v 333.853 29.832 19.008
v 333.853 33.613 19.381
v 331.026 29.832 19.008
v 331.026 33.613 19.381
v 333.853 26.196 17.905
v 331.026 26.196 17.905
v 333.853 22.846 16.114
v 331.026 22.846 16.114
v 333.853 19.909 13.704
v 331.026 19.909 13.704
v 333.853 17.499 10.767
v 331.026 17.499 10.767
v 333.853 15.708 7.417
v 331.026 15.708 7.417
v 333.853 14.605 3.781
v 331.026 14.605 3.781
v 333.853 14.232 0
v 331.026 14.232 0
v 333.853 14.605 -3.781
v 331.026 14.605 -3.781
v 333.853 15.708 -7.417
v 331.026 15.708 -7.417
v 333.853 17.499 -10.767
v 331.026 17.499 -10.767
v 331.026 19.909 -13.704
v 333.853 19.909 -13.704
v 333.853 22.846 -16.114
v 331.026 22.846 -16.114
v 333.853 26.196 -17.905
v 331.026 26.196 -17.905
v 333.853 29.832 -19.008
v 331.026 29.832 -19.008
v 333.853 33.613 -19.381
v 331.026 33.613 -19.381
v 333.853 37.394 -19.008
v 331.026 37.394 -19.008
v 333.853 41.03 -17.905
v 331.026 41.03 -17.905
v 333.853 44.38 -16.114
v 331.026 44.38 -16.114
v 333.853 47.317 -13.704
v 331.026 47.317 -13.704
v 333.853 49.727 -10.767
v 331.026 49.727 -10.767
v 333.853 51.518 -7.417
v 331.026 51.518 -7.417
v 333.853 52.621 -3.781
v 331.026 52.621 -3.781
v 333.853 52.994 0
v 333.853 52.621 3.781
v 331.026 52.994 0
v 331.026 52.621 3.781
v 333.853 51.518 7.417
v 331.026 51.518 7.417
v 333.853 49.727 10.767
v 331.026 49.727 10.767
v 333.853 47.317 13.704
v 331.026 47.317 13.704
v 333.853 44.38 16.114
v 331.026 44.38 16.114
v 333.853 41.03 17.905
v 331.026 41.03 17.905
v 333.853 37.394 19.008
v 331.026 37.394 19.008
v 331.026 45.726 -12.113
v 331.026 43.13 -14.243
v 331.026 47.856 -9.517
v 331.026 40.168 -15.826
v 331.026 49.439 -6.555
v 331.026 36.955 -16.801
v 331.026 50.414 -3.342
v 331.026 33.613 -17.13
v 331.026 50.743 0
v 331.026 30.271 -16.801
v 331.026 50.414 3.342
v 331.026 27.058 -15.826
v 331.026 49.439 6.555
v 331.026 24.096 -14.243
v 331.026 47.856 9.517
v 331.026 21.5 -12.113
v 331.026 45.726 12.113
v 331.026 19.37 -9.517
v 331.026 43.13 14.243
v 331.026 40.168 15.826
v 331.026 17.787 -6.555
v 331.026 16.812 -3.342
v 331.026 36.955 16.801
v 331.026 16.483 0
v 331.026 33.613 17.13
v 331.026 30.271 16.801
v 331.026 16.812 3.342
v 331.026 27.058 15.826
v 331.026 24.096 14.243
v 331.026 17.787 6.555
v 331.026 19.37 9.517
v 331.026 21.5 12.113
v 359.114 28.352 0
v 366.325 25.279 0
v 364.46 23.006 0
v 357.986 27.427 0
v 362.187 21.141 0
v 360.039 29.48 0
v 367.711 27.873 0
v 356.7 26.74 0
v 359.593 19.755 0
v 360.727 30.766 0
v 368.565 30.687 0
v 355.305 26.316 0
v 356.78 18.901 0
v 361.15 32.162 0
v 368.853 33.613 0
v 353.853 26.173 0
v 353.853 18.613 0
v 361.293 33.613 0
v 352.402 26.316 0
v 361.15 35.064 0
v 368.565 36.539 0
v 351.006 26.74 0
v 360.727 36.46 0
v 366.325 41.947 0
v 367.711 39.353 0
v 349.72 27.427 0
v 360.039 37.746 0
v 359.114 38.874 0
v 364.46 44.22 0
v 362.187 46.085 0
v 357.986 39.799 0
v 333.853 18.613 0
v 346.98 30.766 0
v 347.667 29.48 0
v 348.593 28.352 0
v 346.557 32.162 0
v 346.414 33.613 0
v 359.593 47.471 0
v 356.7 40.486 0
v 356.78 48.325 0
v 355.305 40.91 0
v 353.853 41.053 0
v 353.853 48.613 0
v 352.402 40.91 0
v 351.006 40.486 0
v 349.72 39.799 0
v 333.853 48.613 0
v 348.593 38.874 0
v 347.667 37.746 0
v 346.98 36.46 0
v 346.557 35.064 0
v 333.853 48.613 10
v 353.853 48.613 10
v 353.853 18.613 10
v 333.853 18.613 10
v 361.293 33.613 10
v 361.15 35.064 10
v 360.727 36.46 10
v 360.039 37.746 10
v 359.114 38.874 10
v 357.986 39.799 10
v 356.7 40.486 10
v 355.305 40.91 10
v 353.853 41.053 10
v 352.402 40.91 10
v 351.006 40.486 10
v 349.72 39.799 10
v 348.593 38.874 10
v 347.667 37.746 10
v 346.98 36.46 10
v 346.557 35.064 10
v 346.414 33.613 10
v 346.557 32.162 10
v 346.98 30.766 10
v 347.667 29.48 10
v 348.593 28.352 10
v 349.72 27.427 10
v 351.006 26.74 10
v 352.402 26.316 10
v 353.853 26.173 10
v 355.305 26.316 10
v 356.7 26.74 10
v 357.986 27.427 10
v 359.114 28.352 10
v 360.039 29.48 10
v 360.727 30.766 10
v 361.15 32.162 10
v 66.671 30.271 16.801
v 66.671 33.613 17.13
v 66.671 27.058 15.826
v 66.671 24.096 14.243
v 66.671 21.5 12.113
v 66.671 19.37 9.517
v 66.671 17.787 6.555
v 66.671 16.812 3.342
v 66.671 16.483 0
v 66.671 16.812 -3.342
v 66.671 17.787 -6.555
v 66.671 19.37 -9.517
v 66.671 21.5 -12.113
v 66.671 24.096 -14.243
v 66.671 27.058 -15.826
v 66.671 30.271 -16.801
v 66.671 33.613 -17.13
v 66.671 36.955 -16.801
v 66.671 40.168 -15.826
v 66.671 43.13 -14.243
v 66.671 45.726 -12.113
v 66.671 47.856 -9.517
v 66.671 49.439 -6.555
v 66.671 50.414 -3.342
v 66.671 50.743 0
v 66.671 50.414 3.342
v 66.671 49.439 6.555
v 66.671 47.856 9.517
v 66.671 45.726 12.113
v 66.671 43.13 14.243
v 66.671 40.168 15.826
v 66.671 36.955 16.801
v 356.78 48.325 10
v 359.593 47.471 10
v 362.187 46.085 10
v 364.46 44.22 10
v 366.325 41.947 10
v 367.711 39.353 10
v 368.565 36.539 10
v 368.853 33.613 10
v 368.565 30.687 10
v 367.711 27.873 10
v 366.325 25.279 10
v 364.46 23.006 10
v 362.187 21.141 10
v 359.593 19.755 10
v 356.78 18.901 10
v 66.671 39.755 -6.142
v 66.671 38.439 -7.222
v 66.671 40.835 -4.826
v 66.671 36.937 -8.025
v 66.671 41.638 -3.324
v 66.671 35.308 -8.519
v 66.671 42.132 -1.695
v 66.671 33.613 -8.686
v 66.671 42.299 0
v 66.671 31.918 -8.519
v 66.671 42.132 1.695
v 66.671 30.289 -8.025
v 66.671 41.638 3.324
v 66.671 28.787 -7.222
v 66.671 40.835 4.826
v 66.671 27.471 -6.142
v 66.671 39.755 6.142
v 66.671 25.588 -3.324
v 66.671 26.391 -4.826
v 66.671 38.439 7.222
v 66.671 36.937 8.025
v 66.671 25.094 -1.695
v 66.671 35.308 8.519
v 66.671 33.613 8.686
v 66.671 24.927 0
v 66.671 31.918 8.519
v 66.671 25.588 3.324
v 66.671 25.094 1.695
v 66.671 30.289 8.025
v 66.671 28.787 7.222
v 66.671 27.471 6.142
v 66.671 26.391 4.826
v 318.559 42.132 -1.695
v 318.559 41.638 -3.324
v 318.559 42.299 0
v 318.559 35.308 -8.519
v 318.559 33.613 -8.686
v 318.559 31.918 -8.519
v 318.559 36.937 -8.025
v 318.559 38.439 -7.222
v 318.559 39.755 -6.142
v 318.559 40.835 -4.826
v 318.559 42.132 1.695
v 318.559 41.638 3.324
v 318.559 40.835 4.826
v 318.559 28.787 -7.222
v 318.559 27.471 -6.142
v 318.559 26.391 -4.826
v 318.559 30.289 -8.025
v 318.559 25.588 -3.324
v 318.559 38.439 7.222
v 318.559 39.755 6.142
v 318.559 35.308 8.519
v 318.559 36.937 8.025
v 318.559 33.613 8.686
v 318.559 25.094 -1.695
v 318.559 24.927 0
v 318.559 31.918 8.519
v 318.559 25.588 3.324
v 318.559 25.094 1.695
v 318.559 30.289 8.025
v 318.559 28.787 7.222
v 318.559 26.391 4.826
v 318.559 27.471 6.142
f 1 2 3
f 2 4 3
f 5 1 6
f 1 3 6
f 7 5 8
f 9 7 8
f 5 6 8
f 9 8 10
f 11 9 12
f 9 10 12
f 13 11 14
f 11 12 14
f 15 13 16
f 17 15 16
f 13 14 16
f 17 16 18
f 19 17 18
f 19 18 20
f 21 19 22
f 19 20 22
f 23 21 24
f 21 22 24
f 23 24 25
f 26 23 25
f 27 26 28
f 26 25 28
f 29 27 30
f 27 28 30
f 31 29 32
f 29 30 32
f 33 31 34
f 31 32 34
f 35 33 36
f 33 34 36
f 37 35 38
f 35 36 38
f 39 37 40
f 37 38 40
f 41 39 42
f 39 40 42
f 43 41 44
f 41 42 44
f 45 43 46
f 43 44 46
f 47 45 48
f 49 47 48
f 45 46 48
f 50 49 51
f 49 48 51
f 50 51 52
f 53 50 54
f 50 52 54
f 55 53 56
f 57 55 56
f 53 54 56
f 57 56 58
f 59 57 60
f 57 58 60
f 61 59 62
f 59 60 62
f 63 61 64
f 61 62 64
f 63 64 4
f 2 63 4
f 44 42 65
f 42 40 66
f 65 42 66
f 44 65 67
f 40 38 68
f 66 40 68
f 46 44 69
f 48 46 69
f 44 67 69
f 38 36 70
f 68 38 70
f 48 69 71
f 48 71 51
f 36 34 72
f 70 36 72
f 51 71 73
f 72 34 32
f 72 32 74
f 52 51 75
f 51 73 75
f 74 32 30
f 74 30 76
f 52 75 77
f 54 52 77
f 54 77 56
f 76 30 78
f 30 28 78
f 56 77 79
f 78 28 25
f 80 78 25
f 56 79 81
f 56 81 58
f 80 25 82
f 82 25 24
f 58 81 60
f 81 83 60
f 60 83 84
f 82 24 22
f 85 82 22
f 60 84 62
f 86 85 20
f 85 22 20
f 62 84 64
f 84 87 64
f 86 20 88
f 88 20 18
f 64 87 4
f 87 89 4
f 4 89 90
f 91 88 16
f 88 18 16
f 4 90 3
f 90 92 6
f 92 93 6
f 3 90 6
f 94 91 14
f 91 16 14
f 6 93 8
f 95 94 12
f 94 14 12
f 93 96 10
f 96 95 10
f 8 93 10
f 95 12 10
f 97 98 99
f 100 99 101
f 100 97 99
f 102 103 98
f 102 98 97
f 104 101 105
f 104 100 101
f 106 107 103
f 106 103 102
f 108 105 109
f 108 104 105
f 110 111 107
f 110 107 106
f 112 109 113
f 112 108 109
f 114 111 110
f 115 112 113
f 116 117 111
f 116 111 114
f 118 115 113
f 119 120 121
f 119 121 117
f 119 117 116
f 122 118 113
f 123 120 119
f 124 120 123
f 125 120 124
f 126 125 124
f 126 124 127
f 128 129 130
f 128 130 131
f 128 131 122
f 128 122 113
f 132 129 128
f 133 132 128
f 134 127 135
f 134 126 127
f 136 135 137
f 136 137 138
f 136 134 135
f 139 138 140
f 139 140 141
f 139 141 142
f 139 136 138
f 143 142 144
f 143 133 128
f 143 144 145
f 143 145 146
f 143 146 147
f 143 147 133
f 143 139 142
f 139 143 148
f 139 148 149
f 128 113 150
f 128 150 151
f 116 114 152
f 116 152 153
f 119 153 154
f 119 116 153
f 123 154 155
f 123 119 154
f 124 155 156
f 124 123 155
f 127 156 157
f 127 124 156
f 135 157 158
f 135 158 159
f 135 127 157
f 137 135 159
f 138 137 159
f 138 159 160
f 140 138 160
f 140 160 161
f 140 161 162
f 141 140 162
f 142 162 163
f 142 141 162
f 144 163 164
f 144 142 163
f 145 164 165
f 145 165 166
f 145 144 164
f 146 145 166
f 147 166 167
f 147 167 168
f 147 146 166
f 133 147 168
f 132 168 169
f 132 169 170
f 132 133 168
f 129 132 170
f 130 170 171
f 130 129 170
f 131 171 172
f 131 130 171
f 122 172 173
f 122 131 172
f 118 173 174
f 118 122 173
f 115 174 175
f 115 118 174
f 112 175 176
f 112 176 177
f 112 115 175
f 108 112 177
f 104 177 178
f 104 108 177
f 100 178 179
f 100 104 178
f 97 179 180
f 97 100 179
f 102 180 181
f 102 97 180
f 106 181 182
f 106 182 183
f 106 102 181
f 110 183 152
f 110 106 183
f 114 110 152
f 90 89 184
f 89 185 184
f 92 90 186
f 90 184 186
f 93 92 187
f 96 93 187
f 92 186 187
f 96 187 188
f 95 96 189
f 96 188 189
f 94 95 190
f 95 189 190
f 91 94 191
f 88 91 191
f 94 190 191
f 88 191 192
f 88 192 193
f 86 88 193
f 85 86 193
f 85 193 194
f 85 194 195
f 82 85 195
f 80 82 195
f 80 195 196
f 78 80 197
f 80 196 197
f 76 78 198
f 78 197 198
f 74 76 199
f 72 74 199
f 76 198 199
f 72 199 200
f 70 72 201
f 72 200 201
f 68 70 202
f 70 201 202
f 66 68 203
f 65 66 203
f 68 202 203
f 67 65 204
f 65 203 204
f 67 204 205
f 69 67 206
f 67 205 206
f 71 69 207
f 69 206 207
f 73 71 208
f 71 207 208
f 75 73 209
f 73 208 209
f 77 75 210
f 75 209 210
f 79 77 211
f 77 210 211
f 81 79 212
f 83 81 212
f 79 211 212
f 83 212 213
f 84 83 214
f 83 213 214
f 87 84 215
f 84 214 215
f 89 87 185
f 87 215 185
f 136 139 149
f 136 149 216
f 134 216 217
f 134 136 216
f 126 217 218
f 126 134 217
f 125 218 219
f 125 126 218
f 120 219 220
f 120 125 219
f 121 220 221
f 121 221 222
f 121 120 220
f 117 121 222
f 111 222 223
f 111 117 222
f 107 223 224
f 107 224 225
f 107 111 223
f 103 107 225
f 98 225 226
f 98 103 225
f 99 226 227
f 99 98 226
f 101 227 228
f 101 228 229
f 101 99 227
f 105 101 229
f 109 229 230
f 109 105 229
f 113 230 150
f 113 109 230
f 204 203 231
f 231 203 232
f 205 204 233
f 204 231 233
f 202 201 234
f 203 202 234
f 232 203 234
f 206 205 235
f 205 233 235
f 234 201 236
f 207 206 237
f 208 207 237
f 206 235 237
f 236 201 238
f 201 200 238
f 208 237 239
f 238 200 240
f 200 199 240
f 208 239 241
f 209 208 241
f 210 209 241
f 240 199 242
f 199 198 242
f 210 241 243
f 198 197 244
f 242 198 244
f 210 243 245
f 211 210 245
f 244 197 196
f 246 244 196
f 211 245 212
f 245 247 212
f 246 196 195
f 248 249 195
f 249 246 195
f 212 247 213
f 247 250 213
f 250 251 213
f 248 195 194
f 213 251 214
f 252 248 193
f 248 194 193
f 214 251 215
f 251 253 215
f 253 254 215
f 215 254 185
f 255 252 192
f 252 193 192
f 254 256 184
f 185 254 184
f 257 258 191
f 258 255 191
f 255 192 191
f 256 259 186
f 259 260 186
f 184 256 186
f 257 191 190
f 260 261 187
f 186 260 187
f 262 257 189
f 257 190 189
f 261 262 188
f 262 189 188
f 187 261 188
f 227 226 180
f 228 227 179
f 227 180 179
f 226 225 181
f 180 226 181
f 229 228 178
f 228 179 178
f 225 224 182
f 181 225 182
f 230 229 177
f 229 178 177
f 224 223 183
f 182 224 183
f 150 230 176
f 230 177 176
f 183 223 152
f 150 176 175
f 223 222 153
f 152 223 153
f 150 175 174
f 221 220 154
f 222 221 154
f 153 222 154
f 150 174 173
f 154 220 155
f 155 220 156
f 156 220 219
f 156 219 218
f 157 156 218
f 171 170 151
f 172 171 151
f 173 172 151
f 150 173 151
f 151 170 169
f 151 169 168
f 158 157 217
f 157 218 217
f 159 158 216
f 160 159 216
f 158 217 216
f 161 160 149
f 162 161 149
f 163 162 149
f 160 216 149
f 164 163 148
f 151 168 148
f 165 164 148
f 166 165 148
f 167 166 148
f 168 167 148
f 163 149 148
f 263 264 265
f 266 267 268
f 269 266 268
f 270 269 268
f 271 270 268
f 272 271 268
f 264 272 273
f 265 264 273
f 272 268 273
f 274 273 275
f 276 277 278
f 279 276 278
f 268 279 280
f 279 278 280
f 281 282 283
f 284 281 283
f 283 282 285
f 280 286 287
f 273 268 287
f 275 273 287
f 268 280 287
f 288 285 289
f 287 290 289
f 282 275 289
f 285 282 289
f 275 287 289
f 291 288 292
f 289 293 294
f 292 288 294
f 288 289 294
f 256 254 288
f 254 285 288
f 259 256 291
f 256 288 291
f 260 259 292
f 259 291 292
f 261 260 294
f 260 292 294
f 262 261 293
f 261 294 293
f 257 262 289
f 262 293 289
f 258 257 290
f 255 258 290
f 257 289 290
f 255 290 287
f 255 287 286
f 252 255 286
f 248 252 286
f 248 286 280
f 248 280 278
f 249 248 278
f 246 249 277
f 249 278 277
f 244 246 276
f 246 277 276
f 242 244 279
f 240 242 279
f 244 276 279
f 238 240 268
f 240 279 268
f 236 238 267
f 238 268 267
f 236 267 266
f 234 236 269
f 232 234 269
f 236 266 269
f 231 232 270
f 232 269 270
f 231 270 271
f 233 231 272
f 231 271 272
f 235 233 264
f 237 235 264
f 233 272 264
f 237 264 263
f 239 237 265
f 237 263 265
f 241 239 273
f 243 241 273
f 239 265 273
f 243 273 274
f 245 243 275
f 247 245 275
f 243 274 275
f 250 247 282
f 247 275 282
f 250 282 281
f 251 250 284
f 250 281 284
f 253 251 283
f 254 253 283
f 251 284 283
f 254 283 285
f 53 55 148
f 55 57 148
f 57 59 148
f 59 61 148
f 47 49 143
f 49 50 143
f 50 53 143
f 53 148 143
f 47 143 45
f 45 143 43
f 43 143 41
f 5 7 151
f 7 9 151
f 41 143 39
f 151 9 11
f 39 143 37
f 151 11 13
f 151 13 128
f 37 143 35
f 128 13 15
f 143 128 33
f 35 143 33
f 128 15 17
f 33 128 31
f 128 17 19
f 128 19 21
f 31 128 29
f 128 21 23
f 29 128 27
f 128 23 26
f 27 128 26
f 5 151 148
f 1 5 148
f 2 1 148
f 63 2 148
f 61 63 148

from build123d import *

# Parameters (mm, degrees)
SKETCH1_R           = 7.439633922
BOSS_EXTRUDE1_DEPTH = 10


with BuildPart() as part:
    # Sketch1 → Boss-Extrude1 (new body)
    with BuildSketch(Plane.XY):
        with BuildLine():
            Line((333.85321321, 48.612982521), (353.85321321, 48.612982521))
            ThreePointArc((353.85321321, 48.612982521), (368.85321321, 33.612982521), (353.85321321, 18.612982521))
            Line((353.85321321, 18.612982521), (333.85321321, 18.612982521))
            Line((333.85321321, 18.612982521), (333.85321321, 48.612982521))
        make_face()
        with Locations((353.85321321, 33.612982521)):
            Circle(SKETCH1_R, mode=Mode.SUBTRACT)
    extrude(amount=BOSS_EXTRUDE1_DEPTH)

    # Sketch2 → Revolve2 (revolve)
    with BuildSketch(Plane.XY, mode=Mode.PRIVATE) as revolve2_sk:
        Polygon((333.85321321, 48.612982521), (333.85321321, 52.993606974), (331.026376732, 52.993606974), (331.026376732, 50.74274425), (66.67110802, 50.74274425), (66.67110802, 42.299173429), (318.559263149, 42.299173429), (318.559263149, 33.612982521), (333.85321321, 33.612982521), align=None)
    revolve(revolve2_sk.sketch.rotate(Axis((318.559263149, 33.612982521, 0), (1, 0, 0)), 90), axis=Axis((318.559263149, 33.612982521, 0), (1, 0, 0)))


solid = part.part
